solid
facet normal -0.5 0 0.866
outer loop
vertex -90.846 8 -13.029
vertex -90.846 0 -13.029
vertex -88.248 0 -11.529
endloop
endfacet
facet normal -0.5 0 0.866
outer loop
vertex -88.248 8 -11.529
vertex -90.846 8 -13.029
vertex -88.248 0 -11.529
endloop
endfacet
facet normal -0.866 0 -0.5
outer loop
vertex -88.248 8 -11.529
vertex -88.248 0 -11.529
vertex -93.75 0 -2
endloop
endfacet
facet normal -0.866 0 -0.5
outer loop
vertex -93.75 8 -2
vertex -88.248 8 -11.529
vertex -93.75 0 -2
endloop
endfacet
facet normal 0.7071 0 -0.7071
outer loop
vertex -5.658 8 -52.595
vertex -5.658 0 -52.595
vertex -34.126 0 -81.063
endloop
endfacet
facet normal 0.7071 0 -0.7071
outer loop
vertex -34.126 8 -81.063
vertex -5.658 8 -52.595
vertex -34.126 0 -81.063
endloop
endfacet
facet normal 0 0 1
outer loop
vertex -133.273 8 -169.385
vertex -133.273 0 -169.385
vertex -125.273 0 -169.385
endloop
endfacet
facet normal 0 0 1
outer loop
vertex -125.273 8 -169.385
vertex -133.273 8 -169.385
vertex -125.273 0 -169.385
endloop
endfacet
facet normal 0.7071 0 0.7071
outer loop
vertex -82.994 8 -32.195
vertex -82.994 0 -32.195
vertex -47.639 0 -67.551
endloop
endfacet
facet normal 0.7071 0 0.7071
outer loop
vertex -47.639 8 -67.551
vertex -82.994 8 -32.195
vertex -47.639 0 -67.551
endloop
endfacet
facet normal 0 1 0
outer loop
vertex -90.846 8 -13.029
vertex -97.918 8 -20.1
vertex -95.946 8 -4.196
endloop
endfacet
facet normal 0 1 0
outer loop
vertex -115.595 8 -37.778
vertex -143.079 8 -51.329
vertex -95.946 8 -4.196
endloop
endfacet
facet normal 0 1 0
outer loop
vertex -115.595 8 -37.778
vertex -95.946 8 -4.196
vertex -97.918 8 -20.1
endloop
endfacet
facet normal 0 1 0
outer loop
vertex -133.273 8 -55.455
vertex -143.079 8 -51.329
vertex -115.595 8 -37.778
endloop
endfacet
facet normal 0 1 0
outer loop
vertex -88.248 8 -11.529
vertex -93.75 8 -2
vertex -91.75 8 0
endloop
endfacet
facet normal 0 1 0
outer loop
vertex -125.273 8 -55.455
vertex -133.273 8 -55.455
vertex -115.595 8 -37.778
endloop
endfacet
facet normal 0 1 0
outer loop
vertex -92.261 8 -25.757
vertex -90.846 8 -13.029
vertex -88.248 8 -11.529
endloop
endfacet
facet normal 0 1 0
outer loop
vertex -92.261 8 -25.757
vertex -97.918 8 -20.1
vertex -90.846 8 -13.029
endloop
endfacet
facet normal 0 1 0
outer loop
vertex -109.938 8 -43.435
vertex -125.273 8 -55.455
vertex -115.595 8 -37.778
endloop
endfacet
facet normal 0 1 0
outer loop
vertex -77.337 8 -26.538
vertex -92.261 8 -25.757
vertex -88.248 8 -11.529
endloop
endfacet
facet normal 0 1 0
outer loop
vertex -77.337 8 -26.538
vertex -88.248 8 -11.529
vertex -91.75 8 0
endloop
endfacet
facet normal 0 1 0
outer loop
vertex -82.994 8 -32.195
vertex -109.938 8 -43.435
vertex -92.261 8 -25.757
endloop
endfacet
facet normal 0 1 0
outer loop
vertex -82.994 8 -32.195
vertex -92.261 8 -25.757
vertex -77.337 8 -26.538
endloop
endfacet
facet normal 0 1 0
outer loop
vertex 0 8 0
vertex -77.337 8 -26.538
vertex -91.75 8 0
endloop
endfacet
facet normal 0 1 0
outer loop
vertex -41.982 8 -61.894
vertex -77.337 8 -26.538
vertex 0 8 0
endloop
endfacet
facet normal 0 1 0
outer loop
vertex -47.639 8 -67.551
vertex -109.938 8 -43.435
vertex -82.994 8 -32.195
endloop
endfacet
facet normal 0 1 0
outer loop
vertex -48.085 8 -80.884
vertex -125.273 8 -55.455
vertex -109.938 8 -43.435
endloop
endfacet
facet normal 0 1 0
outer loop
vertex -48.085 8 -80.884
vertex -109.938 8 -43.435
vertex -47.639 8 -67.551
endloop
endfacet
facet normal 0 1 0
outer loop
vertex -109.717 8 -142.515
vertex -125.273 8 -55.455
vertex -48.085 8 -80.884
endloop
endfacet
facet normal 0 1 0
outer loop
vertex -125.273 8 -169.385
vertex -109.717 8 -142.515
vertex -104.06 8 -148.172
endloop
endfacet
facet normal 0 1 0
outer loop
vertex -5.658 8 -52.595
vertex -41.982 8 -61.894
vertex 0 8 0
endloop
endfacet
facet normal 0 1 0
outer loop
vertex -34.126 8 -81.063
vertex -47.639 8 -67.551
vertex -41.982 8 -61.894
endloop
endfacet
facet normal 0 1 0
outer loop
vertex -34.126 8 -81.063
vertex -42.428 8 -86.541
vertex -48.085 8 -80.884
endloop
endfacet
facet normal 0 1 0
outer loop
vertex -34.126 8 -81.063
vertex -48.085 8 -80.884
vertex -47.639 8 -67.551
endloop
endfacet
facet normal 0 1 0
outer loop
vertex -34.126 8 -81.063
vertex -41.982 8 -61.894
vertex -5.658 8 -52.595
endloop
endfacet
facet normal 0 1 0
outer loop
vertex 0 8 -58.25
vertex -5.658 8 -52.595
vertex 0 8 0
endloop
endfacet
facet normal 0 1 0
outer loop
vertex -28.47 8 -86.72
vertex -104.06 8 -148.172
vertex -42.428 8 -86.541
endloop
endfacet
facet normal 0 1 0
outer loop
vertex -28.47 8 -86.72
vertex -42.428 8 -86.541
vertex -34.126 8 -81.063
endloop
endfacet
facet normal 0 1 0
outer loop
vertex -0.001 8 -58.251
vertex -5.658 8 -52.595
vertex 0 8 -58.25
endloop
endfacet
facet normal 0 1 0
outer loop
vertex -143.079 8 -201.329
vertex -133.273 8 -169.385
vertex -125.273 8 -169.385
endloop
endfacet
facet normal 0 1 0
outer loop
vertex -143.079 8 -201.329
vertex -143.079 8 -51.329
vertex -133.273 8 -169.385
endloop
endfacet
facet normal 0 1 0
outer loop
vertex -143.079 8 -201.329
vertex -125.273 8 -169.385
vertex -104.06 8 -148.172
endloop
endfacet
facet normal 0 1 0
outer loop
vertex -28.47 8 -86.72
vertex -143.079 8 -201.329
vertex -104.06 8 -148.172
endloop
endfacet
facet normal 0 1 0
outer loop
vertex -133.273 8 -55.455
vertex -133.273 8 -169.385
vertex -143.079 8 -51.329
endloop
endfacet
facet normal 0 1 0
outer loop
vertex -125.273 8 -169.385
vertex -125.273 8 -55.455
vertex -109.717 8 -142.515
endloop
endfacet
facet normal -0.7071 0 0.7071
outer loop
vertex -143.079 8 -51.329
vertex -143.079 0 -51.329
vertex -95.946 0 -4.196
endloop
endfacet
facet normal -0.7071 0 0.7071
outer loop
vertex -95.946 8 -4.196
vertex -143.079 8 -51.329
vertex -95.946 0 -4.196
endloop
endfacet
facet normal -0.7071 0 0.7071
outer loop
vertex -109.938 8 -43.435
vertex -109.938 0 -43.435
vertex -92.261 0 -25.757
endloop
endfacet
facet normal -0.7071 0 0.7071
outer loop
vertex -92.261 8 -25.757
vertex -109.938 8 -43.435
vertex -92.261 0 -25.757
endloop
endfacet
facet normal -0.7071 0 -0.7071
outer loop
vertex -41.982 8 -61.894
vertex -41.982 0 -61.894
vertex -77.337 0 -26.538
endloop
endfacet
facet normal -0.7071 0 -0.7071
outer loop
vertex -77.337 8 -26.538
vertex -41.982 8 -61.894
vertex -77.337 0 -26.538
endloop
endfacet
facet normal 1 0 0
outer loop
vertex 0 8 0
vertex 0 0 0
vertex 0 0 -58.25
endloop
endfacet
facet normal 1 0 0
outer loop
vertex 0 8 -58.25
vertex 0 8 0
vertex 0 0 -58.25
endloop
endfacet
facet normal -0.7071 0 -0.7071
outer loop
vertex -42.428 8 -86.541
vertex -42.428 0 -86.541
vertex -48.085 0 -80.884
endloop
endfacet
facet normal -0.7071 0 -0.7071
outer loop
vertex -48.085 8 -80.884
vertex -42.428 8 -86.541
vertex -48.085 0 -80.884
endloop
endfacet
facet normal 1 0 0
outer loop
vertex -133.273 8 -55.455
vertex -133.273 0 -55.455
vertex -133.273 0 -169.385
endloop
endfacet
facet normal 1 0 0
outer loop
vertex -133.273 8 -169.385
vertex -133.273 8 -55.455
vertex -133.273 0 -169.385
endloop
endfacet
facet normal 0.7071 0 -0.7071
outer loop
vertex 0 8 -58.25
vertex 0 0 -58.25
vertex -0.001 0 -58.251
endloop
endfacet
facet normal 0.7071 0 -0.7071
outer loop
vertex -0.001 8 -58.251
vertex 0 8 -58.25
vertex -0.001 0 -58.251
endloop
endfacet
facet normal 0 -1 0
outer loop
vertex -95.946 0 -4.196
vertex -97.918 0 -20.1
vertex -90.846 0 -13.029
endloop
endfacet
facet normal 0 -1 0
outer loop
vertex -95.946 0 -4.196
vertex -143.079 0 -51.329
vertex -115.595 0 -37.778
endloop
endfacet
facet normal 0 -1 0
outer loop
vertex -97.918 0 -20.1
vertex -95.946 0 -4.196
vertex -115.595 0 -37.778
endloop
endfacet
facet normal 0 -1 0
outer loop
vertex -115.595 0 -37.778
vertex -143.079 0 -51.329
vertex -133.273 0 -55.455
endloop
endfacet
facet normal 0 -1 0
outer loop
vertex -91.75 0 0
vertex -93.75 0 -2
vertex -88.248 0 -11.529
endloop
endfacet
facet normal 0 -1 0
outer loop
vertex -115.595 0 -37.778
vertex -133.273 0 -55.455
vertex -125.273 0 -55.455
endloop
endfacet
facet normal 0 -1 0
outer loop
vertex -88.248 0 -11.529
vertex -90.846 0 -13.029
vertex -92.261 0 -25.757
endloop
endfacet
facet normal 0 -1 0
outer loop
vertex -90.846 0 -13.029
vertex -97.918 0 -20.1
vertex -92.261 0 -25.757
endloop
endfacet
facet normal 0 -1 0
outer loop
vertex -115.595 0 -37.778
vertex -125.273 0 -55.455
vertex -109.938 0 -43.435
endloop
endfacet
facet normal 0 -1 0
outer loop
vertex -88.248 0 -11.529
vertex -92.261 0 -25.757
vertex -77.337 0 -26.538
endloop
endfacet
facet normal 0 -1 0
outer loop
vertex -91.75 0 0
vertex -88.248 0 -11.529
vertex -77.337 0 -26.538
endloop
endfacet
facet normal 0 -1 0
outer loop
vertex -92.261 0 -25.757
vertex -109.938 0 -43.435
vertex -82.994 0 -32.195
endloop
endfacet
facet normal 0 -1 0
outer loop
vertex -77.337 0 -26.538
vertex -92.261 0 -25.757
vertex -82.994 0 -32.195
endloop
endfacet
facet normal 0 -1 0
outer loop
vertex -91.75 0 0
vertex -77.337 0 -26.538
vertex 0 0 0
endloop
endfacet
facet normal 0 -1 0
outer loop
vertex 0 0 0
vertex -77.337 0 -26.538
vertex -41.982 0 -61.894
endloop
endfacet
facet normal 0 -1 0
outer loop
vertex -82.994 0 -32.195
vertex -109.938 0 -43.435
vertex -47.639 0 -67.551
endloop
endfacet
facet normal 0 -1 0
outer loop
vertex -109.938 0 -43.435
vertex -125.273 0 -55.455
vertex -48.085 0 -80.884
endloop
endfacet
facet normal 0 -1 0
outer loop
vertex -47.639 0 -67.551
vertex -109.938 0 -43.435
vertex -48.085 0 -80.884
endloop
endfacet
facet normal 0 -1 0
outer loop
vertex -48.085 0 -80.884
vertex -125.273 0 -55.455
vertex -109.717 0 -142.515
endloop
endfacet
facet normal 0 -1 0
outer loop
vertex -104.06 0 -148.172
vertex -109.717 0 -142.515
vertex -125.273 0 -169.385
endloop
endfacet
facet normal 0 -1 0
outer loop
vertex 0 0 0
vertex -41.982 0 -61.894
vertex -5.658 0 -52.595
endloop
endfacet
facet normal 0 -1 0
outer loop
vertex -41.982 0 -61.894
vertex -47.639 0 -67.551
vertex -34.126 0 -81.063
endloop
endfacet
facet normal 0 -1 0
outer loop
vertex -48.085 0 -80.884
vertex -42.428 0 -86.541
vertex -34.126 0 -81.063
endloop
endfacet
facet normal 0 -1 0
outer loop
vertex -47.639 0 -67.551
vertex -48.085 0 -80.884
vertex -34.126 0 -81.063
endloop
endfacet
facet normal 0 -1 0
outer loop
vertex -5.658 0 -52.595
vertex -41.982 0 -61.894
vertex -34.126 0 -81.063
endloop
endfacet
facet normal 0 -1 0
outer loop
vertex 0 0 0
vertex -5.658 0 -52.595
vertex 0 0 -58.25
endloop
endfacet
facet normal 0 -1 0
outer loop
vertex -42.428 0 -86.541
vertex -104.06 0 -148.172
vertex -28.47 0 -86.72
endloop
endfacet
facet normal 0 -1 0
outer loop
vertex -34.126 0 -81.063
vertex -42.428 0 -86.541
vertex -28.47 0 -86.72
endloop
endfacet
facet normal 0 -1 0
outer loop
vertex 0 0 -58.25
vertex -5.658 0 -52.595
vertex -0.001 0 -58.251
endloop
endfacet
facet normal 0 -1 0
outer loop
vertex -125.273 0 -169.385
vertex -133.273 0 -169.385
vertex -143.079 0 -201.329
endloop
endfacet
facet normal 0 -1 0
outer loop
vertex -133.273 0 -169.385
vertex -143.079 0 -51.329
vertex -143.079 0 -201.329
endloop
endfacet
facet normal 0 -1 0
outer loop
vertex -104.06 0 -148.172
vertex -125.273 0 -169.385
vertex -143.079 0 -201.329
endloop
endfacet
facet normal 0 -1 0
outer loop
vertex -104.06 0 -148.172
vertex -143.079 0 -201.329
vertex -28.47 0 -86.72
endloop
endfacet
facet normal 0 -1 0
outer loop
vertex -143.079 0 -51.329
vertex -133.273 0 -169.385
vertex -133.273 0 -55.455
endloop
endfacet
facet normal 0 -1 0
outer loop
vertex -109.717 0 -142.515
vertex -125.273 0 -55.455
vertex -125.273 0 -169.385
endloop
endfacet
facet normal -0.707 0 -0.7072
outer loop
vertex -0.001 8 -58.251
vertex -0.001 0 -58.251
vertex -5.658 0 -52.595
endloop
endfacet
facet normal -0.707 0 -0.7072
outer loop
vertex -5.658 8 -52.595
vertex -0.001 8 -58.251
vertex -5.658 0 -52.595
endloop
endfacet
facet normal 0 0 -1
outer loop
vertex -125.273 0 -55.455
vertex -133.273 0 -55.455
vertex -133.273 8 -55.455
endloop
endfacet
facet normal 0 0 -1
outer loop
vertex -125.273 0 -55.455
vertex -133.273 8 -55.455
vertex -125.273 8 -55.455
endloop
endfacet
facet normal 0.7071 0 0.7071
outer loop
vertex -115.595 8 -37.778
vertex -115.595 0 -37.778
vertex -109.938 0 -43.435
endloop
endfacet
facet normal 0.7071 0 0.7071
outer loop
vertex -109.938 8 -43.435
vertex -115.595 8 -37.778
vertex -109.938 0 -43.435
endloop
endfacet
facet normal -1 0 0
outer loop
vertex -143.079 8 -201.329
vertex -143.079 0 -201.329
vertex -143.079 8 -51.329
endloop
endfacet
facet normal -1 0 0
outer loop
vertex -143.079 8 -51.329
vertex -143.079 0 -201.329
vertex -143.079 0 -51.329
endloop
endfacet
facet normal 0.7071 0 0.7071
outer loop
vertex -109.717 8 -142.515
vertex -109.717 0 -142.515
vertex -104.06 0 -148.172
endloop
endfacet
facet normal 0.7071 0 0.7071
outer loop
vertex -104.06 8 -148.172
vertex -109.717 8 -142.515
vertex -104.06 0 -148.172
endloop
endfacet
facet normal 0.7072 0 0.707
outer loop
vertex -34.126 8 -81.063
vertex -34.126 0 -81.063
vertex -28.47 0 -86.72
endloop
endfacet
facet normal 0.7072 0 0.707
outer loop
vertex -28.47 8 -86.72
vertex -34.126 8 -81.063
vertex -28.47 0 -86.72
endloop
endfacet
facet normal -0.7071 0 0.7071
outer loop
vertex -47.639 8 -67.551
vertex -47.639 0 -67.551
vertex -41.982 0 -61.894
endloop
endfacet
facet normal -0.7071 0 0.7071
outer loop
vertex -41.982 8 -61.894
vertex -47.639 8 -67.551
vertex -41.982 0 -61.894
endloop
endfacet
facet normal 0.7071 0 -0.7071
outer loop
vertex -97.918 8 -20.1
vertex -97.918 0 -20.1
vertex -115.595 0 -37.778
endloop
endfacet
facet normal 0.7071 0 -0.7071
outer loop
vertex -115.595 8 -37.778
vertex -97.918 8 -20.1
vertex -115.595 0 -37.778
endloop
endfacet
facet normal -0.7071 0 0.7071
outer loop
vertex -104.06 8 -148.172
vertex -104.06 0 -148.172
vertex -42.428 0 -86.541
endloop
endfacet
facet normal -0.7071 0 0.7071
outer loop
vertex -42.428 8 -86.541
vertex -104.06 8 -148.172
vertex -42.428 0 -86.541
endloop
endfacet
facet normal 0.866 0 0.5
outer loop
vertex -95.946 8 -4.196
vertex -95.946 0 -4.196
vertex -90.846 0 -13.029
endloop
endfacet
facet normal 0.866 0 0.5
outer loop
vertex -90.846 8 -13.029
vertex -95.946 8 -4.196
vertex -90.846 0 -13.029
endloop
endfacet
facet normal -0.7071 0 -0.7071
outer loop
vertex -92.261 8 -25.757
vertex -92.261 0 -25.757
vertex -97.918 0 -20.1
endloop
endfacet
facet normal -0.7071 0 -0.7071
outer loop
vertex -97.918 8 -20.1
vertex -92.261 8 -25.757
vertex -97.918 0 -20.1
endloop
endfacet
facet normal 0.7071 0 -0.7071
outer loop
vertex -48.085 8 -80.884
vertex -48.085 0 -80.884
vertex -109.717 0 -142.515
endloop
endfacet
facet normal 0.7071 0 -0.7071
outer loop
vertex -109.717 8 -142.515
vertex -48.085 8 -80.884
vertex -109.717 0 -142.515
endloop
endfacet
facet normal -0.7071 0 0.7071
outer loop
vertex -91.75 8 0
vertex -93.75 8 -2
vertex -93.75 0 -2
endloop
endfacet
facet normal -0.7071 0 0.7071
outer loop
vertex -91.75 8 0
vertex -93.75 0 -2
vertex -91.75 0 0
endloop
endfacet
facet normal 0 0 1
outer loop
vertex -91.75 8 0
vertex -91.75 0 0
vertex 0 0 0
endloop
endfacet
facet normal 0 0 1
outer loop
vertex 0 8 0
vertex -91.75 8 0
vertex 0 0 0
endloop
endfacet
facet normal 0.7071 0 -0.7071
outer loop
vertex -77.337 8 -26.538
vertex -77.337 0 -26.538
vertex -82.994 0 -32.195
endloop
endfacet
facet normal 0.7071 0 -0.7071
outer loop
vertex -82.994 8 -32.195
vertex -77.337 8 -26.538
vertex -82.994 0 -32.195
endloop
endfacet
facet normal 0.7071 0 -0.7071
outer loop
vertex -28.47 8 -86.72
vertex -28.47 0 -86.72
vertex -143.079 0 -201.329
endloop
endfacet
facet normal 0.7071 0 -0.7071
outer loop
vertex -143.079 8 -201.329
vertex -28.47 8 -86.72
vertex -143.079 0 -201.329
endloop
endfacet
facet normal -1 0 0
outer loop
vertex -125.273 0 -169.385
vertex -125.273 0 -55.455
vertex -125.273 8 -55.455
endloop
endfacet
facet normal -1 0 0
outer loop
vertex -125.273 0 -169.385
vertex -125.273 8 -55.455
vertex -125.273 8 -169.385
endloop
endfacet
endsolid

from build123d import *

# Parameters (mm, degrees)
SKETCH1_W           = 8
SKETCH1_H           = 113.93
BOSS_EXTRUDE1_DEPTH = 8


with BuildPart() as part:
    # Sketch1 → Boss-Extrude1 (new body)
    with BuildSketch(Plane(origin=(0, 0, 0), x_dir=(1, 0, 0), z_dir=(0, 1, 0))):
        Polygon((-91.75, 0), (0, 0), (0, 58.25), (-0.001499297, 58.251499297), (-5.658353547, 52.594645048), (-34.126472557, 81.062764058), (-28.469618308, 86.719618308), (-143.078881246, 201.328881246), (-143.078881246, 51.328881246), (-95.946152423, 4.196152423), (-90.846474596, 13.02905352), (-88.248398385, 11.52905352), (-93.75, 2), align=None)
        Polygon((-97.917542408, 20.100121332), (-115.595211938, 37.777790862), (-109.938357688, 43.434645111), (-92.260688159, 25.756975582), align=None, mode=Mode.SUBTRACT)
        Polygon((-77.337199542, 26.538328575), (-82.994053791, 32.195182824), (-47.638714732, 67.550521884), (-41.981860482, 61.893667634), align=None, mode=Mode.SUBTRACT)
        with Locations((-129.272881467, 112.420460392)):
            Rectangle(SKETCH1_W, SKETCH1_H, mode=Mode.SUBTRACT)
        Polygon((-48.085105233, 80.883975658), (-109.716532281, 142.515402707), (-104.059678032, 148.172256956), (-42.428250984, 86.540829908), align=None, mode=Mode.SUBTRACT)
    extrude(amount=BOSS_EXTRUDE1_DEPTH)


solid = part.part
